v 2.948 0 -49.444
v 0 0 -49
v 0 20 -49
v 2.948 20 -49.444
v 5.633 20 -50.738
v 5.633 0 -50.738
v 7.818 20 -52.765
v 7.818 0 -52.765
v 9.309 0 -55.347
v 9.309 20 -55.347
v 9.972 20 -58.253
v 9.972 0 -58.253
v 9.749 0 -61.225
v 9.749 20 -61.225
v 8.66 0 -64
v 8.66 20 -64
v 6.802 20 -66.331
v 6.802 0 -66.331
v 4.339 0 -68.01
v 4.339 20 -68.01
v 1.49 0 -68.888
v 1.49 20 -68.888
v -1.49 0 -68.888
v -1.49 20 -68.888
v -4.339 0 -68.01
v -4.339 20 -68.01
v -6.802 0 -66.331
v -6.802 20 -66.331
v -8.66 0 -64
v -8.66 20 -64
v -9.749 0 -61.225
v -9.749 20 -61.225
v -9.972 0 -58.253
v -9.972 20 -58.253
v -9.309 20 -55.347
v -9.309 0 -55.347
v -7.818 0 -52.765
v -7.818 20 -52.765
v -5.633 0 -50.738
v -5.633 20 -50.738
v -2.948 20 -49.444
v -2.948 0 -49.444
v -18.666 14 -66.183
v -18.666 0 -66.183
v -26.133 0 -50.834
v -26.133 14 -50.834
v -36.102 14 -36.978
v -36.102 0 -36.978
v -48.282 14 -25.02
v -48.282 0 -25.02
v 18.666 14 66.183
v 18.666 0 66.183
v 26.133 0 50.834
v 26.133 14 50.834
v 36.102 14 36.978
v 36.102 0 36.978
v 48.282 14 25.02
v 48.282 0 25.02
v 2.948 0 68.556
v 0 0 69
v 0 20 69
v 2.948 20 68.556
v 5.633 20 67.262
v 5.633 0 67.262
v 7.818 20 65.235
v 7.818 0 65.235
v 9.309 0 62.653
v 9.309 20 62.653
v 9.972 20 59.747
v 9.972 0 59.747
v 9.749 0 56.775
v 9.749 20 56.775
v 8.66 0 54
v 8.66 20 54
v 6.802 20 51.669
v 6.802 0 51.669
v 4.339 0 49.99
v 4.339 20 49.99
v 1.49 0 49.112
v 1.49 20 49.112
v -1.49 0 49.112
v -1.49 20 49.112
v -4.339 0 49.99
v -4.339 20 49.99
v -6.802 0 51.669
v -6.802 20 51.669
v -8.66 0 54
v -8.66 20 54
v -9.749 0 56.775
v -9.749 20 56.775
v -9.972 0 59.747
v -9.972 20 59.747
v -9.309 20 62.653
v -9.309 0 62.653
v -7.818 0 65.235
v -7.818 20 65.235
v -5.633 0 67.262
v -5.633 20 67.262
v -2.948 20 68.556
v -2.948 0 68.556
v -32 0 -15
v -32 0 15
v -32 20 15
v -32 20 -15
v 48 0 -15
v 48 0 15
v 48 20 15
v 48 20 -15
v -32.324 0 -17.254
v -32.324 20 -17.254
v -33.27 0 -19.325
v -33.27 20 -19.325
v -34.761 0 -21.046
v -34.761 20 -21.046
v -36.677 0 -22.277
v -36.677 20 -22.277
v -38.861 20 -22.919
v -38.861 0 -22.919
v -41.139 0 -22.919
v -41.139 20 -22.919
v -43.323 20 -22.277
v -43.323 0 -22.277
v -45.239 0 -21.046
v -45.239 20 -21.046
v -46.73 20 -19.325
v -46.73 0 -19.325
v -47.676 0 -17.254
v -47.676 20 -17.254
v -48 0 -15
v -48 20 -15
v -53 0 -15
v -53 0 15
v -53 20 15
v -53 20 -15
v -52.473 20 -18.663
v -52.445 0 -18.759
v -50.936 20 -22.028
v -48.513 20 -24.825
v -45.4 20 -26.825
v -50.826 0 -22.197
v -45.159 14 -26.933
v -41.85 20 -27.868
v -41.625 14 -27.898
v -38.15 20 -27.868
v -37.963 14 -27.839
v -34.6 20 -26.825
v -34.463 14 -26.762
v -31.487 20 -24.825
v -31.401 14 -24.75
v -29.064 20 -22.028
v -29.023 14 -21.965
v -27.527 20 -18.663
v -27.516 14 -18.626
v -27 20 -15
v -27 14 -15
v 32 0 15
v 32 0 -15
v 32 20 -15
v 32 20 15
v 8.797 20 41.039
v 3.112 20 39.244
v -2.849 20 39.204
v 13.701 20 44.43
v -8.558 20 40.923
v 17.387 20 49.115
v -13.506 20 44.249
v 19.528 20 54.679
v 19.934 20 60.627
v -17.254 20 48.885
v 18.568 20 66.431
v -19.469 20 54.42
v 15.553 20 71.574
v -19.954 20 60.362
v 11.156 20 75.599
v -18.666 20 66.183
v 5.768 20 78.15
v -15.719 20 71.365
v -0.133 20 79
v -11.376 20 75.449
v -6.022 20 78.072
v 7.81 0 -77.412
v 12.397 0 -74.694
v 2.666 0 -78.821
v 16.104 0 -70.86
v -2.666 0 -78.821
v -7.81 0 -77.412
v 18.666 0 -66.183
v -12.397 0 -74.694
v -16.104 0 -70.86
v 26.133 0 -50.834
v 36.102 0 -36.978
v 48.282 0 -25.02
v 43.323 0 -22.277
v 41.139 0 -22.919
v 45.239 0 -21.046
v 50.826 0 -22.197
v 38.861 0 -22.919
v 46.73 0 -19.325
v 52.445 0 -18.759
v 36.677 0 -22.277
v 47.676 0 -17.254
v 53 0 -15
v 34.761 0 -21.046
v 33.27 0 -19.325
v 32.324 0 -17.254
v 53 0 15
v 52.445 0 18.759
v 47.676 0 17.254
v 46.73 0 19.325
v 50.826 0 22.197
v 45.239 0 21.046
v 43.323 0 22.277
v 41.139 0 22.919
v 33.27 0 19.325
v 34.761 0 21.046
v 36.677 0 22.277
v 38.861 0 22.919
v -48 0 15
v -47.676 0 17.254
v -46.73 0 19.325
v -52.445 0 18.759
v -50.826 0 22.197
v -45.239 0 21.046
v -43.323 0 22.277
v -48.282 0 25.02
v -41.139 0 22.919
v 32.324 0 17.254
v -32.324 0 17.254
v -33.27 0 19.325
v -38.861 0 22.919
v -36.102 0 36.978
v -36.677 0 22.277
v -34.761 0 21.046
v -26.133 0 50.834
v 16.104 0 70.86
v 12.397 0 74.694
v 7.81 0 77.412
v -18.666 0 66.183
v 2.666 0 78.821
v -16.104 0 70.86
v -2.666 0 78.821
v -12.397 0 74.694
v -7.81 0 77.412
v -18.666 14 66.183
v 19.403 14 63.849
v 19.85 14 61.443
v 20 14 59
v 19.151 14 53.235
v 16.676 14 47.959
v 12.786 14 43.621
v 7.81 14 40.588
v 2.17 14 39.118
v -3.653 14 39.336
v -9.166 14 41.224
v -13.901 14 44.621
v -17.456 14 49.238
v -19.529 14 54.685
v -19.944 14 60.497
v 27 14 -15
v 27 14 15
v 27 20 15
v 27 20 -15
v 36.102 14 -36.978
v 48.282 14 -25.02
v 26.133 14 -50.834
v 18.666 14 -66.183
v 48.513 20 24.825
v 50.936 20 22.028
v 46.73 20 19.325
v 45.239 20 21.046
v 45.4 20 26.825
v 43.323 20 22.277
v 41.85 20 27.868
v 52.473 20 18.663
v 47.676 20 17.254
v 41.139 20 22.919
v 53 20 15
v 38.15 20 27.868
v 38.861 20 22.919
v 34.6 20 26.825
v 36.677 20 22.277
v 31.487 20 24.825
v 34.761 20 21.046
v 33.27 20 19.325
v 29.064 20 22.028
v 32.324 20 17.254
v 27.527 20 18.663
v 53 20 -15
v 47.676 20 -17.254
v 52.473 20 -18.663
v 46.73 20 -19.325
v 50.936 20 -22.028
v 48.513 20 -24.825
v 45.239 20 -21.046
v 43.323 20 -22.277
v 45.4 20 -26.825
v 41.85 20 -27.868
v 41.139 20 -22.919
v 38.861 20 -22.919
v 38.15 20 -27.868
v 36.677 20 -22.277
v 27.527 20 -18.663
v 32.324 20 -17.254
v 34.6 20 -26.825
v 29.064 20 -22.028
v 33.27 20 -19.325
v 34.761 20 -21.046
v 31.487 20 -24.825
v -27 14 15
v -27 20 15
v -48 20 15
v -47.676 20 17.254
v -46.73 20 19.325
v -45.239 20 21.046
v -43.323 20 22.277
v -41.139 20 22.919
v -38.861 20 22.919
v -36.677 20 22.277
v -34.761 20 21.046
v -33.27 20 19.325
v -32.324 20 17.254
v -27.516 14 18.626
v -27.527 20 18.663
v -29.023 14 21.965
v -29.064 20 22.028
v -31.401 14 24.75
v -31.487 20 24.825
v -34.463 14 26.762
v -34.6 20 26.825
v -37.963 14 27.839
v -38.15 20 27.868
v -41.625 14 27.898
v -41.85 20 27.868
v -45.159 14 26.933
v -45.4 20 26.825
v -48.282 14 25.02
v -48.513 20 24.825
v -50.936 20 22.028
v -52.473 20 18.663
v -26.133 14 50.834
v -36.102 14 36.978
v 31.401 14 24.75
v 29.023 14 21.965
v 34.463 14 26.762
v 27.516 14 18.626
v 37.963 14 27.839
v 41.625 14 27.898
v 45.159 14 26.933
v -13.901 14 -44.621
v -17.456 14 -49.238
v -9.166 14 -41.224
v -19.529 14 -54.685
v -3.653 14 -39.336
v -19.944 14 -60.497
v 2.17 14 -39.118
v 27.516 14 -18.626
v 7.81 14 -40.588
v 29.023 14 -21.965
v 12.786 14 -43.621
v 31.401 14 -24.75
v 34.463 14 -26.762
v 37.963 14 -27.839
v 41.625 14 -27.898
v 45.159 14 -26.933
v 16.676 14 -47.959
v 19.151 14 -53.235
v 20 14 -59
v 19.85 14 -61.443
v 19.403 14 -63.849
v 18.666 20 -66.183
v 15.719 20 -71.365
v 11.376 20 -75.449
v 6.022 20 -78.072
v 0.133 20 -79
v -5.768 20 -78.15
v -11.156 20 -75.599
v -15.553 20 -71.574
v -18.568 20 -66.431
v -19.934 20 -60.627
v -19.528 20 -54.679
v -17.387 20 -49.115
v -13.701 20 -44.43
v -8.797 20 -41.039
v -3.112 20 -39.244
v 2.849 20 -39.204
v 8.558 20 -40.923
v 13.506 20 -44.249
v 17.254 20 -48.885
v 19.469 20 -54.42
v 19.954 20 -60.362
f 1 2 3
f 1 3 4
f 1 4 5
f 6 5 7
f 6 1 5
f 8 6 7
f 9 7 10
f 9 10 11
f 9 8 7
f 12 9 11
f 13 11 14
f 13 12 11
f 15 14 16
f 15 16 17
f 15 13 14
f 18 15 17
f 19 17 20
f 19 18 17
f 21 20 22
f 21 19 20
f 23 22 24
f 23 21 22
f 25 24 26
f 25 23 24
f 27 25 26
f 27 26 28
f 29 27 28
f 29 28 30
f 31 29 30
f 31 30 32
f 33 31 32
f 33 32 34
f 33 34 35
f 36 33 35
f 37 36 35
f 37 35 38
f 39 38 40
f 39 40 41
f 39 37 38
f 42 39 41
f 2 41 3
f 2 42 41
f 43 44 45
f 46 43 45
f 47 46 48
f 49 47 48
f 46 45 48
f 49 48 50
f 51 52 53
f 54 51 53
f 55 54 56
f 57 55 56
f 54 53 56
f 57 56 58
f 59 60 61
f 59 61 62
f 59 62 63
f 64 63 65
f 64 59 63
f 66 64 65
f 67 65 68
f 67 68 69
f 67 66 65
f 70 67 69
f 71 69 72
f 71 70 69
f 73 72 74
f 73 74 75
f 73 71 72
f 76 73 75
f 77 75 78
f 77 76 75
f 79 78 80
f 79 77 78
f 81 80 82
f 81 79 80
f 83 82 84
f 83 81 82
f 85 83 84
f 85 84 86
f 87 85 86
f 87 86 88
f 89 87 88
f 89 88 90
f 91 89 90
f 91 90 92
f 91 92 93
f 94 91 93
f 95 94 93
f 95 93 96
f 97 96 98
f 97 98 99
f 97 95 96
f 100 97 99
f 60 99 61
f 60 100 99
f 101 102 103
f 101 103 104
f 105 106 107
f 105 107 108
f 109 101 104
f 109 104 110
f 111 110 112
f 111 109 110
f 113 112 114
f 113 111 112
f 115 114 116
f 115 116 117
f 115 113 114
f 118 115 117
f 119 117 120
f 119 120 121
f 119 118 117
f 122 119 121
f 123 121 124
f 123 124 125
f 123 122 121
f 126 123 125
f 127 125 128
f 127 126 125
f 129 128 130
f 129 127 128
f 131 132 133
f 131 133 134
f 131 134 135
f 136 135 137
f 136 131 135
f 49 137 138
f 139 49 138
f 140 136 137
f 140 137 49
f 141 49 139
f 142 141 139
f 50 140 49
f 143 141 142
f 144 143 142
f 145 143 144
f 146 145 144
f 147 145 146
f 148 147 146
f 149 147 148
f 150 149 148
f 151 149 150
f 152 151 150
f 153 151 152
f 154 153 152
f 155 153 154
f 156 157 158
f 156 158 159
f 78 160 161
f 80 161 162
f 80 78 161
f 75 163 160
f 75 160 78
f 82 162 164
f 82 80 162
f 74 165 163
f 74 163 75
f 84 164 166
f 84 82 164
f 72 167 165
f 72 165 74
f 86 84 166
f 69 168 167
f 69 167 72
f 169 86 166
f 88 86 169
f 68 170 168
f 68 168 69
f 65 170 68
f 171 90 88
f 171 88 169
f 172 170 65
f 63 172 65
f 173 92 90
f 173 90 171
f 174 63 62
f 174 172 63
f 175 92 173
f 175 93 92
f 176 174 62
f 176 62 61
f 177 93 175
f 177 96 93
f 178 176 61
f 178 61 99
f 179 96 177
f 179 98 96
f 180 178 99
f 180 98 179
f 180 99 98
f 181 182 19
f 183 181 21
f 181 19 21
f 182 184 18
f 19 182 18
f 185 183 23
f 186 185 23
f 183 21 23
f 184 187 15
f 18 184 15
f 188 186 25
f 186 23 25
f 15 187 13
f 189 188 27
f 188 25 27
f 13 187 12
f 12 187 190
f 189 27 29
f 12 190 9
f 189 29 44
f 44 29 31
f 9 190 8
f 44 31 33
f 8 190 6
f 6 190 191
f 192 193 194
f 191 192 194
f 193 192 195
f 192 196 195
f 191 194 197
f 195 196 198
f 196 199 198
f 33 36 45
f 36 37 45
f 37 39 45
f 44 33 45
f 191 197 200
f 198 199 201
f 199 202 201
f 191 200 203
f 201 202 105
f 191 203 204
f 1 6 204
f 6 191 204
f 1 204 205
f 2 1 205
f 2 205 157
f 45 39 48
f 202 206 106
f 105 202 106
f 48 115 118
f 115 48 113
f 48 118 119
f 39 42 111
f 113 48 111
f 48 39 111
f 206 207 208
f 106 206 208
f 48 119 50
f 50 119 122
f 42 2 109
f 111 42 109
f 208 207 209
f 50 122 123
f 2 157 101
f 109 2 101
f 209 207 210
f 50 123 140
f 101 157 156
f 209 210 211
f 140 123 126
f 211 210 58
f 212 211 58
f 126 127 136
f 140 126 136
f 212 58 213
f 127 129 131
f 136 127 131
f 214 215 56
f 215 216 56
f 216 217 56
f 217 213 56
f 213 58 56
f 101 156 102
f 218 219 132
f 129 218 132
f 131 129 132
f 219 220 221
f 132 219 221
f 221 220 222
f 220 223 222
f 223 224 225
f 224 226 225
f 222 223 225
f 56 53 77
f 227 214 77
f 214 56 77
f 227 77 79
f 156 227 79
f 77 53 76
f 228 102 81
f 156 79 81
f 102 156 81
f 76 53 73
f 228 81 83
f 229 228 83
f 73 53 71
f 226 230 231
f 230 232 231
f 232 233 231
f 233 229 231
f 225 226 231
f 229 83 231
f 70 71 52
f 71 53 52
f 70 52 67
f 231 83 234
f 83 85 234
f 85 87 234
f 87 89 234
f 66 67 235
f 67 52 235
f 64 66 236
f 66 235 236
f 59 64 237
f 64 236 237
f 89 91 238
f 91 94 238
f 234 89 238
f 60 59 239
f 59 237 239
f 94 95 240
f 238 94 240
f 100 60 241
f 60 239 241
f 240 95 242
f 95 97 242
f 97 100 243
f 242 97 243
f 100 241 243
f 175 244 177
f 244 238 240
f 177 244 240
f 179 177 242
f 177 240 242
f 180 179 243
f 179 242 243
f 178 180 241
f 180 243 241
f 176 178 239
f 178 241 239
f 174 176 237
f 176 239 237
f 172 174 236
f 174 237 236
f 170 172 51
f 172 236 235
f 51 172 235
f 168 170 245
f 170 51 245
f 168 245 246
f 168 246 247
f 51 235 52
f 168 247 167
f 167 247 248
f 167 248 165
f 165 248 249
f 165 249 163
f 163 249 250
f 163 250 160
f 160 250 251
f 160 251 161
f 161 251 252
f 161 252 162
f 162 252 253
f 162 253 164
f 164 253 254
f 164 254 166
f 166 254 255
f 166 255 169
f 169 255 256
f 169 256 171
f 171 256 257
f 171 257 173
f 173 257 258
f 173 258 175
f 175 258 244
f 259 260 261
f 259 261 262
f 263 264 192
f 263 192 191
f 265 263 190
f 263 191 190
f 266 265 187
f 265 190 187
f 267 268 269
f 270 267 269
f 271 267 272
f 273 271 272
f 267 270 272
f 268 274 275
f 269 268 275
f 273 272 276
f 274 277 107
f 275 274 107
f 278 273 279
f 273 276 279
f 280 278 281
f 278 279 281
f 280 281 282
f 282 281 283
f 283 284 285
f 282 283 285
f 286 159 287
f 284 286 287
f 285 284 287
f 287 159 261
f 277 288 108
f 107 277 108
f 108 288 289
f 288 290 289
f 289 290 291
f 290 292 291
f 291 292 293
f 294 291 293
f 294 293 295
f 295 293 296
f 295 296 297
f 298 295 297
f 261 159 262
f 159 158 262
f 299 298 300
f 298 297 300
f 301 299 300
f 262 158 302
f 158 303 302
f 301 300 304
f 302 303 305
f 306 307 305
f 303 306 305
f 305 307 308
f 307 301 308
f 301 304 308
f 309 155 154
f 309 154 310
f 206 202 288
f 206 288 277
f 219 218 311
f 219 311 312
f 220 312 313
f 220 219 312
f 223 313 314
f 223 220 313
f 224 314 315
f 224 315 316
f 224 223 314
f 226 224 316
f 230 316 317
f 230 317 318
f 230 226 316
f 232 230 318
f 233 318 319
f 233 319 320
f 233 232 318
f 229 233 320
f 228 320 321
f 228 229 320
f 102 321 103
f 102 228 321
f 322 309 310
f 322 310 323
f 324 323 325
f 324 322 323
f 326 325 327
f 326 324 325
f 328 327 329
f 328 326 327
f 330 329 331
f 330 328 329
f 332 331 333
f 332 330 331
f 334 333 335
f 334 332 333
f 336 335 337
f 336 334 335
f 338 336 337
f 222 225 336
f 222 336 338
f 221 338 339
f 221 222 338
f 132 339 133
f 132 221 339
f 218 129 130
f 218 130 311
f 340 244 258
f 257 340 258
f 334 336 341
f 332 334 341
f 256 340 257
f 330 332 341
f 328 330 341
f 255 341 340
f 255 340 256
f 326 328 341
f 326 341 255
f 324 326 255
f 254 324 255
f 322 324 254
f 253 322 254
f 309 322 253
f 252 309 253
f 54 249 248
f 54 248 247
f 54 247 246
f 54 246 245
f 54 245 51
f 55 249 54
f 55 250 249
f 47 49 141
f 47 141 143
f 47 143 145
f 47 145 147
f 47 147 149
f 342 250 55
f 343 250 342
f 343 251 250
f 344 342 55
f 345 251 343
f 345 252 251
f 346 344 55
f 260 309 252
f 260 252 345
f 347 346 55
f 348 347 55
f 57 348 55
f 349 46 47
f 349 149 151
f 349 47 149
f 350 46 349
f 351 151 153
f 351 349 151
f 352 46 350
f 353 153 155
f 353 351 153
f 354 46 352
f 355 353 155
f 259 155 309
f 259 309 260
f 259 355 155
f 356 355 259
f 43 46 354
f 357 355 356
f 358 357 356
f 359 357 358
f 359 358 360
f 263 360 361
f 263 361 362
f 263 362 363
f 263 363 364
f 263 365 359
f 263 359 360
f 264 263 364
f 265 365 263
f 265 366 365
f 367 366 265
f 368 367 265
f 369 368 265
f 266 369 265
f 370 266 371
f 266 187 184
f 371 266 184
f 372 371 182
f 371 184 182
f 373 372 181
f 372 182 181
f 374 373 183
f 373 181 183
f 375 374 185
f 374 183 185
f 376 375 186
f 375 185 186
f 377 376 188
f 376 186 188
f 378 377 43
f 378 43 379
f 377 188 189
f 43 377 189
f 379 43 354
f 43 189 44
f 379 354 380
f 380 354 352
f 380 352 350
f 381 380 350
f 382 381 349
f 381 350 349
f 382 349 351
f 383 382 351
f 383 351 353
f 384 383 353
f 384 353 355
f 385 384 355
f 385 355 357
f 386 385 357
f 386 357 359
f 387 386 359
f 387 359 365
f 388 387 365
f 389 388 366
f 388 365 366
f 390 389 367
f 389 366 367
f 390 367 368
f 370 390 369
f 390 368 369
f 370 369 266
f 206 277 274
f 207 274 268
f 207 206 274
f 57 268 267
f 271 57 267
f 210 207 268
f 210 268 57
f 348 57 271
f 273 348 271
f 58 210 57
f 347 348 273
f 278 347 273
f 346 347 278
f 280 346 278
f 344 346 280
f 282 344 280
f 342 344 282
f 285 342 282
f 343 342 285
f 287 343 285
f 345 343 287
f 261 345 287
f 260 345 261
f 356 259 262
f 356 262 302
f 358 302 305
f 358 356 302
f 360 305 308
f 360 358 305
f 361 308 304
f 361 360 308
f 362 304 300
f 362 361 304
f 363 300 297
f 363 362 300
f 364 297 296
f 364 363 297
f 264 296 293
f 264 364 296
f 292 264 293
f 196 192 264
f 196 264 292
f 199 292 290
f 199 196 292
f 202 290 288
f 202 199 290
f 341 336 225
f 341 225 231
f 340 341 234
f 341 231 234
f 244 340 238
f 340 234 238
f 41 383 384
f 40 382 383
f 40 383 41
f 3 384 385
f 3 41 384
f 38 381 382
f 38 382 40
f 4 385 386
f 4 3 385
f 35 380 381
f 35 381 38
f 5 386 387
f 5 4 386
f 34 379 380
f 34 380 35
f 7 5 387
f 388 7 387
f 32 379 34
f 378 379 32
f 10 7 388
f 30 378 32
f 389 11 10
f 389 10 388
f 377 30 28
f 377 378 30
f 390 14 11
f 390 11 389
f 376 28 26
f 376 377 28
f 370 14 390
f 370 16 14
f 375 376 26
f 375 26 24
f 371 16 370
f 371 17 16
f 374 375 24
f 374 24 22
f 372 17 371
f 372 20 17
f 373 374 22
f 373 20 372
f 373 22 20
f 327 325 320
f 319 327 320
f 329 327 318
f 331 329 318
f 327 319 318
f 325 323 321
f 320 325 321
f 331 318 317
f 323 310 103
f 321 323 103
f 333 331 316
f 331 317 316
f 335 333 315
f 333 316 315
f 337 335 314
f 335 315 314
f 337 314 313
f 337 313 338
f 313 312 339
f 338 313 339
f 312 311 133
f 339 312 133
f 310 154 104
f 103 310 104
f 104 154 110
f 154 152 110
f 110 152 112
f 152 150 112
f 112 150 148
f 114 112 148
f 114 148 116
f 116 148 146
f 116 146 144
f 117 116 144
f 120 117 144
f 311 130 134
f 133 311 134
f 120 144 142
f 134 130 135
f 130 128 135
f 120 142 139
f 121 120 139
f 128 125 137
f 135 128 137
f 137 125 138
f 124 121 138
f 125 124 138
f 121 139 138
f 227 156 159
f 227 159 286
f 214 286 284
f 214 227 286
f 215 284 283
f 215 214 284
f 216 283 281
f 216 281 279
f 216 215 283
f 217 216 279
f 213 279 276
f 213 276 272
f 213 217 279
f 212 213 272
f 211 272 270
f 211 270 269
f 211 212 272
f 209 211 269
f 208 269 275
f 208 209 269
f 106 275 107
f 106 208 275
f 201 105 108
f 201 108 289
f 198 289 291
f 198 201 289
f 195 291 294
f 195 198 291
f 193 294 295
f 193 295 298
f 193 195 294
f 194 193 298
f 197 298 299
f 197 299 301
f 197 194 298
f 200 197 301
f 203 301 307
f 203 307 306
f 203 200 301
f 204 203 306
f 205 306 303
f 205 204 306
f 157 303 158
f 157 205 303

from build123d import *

# Parameters (mm, degrees)
BOSS_EXTRUDE1_DEPTH = 14
SKETCH1_3_R         = 20
SKETCH1_3_R_2       = 10
BOSS_EXTRUDE2_DEPTH = 20


with BuildPart() as part:
    # Sketch1 → Boss-Extrude1 (new body)
    with BuildSketch(Plane(origin=(0, 0, 0), x_dir=(1, 0, 0), z_dir=(0, 1, 0))):
        with BuildLine():
            ThreePointArc((48.282498705, -25.019990778), (34.462513349, -26.76164281), (27, -15))
            Line((27, -15), (27, 15))
            ThreePointArc((27, 15), (34.462513349, 26.76164281), (48.282498705, 25.019990778))
            ThreePointArc((48.282498705, 25.019990778), (30.821521428, 43.692867837), (18.665671202, 66.182807153))
            ThreePointArc((18.665671202, 66.182807153), (19.663588483, 62.652846559), (20, 59))
            ThreePointArc((20, 59), (-3.652846559, 39.336411517), (-18.665671202, 66.182807153))
            ThreePointArc((-18.665671202, 66.182807153), (-30.821521428, 43.692867837), (-48.282498705, 25.019990778))
            ThreePointArc((-48.282498705, 25.019990778), (-34.462513349, 26.76164281), (-27, 15))
            Line((-27, 15), (-27, -15))
            ThreePointArc((-27, -15), (-34.462513349, -26.76164281), (-48.282498705, -25.019990778))
            ThreePointArc((-48.282498705, -25.019990778), (-30.821521428, -43.692867837), (-18.665671202, -66.182807153))
            ThreePointArc((-18.665671202, -66.182807153), (-3.652846559, -39.336411517), (20, -59))
            ThreePointArc((20, -59), (19.663588483, -62.652846559), (18.665671202, -66.182807153))
            ThreePointArc((18.665671202, -66.182807153), (30.821521428, -43.692867837), (48.282498705, -25.019990778))
        make_face()
    extrude(amount=BOSS_EXTRUDE1_DEPTH)

    # Sketch1<3> → Boss-Extrude2 (add)
    # profile 1 of 4: a face of its own
    with BuildSketch(Plane(origin=(0, 0, 0), x_dir=(1, 0, 0), z_dir=(0, 1, 0))):
        with BuildLine():
            Line((27, 15), (27, -15))
            ThreePointArc((27, -15), (40, -28), (53, -15))
            Line((53, -15), (53, 15))
            ThreePointArc((53, 15), (40, 28), (27, 15))
        make_face()
        with BuildLine():
            ThreePointArc((48, -15), (40, -23), (32, -15))
            Line((32, -15), (32, 15))
            ThreePointArc((32, 15), (40, 23), (48, 15))
            Line((48, 15), (48, -15))
        make_face(mode=Mode.SUBTRACT)
    # profile 2 of 4: a face of its own
    with BuildSketch(Plane(origin=(0, 0, 0), x_dir=(1, 0, 0), z_dir=(0, 1, 0))):
        with Locations((0, -59)):
            Circle(SKETCH1_3_R)
        with Locations((0, -59)):
            Circle(SKETCH1_3_R_2, mode=Mode.SUBTRACT)
    # profile 3 of 4: a face of its own
    with BuildSketch(Plane(origin=(0, 0, 0), x_dir=(1, 0, 0), z_dir=(0, 1, 0))):
        with Locations((0, 59)):
            Circle(SKETCH1_3_R)
        with Locations((0, 59)):
            Circle(SKETCH1_3_R_2, mode=Mode.SUBTRACT)
    # profile 4 of 4: a face of its own
    with BuildSketch(Plane(origin=(0, 0, 0), x_dir=(1, 0, 0), z_dir=(0, 1, 0))):
        with BuildLine():
            ThreePointArc((-53, -15), (-40, -28), (-27, -15))
            Line((-27, -15), (-27, 15))
            ThreePointArc((-27, 15), (-40, 28), (-53, 15))
            Line((-53, 15), (-53, -15))
        make_face()
        with BuildLine():
            ThreePointArc((-32, -15), (-40, -23), (-48, -15))
            Line((-48, -15), (-48, 15))
            ThreePointArc((-48, 15), (-40, 23), (-32, 15))
            Line((-32, 15), (-32, -15))
        make_face(mode=Mode.SUBTRACT)
    extrude(amount=BOSS_EXTRUDE2_DEPTH)


solid = part.part
